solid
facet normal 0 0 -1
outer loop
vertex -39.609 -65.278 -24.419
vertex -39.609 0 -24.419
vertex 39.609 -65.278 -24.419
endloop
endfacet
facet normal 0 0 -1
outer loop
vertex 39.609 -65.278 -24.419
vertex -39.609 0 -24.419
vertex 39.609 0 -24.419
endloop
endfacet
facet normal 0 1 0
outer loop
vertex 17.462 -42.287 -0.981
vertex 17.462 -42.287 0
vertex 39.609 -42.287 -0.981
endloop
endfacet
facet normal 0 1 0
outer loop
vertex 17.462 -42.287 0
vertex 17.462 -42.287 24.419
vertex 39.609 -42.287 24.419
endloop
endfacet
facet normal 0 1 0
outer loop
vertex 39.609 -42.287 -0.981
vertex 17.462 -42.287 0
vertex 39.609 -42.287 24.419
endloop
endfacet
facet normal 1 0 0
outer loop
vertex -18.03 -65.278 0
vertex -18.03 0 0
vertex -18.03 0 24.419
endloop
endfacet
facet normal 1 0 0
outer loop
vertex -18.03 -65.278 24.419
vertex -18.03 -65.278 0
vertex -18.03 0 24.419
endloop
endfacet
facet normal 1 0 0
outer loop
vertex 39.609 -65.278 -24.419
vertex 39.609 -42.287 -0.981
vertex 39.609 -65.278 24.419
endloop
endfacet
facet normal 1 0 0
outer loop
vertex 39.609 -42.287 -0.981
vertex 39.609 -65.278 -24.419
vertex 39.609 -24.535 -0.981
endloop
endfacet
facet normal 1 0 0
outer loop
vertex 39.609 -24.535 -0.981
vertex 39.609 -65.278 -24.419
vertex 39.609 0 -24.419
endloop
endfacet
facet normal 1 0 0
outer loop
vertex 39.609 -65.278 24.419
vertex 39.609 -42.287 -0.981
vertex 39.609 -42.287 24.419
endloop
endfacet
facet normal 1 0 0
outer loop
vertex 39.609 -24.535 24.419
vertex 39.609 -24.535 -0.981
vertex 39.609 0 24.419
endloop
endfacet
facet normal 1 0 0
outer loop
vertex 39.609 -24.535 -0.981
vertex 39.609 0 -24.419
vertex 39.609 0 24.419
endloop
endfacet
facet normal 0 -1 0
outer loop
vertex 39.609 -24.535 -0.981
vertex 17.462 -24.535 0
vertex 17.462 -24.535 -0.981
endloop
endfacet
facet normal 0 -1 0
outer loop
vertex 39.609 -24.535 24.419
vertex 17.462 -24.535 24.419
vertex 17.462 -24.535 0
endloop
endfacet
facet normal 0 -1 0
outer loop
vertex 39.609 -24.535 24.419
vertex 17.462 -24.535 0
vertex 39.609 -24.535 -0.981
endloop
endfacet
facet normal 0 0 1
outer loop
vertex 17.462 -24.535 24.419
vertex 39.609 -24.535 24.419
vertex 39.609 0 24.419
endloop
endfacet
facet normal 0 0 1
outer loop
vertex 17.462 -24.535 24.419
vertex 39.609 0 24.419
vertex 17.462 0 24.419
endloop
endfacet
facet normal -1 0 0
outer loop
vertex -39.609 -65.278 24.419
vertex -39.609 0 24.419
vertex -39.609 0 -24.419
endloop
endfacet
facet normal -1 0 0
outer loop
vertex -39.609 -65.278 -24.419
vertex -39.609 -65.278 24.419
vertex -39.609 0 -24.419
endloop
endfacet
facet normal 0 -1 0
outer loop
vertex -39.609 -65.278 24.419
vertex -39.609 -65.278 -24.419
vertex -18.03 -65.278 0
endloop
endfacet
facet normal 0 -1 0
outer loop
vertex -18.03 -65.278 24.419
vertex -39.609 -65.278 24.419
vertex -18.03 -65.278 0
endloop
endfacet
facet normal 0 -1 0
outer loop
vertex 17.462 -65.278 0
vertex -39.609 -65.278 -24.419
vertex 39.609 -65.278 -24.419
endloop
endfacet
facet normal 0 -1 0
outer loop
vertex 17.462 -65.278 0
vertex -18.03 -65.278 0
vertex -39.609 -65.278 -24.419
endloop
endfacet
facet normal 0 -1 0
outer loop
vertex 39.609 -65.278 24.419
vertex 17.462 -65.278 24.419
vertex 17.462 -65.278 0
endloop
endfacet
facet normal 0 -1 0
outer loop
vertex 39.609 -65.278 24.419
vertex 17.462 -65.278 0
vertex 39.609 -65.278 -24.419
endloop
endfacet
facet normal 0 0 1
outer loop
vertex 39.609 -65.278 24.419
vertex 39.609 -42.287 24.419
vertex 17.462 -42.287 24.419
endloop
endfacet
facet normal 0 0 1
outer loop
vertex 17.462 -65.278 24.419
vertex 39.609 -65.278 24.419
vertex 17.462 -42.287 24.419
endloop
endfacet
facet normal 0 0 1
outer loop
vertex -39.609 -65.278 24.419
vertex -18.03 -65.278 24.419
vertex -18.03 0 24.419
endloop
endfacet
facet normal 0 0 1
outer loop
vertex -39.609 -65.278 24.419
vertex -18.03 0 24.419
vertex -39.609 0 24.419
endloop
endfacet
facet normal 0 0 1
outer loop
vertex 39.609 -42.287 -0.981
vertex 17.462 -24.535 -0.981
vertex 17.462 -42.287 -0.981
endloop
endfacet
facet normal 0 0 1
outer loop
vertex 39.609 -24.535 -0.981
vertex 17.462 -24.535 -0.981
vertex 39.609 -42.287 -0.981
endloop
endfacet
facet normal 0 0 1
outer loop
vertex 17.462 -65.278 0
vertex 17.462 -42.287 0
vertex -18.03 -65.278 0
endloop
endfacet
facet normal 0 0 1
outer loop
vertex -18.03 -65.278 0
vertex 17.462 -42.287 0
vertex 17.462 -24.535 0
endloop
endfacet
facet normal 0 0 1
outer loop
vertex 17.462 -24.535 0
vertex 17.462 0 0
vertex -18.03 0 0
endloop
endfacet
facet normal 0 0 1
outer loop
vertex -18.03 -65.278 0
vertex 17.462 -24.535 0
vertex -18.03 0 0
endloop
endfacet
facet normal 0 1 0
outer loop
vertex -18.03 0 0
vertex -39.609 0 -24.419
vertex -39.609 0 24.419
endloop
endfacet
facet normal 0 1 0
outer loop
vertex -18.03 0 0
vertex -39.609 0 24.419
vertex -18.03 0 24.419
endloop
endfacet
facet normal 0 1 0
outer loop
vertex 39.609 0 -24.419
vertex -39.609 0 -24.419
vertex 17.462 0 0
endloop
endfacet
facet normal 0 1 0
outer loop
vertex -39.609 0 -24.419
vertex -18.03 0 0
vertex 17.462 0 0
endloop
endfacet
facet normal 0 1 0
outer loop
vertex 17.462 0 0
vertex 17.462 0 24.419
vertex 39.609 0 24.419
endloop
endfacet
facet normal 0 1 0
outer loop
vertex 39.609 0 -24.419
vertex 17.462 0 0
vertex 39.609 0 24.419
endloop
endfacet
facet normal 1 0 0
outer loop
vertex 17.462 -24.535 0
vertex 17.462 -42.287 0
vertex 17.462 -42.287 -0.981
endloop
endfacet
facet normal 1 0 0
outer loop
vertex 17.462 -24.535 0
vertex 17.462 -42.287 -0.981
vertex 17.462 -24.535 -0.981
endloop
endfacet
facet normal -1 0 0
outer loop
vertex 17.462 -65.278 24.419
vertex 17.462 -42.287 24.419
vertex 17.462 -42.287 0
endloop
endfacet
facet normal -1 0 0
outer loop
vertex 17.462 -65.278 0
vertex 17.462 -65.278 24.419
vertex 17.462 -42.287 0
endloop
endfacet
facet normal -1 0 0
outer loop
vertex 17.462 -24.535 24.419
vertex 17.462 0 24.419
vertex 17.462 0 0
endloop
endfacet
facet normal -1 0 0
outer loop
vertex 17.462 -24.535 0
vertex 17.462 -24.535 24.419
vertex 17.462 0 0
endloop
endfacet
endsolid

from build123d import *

# Parameters (mm, degrees)
F1_DEPTH = 65.278
F2_W     = 22.147088
F2_H     = 17.75202
F3_DEPTH = 25.4


with BuildPart() as f1:
    # F0 (on Front) → F1 (new body)
    with BuildSketch(Plane.XZ):
        Polygon((-18.030003, 24.418592), (-39.609224, 24.418592), (-39.609224, -24.418592), (39.609224, -24.418592), (39.609224, 24.418592), (17.462136, 24.418592), (17.462136, 0), (-11.215512, 0), (-18.030003, 0), align=None)
    extrude(amount=F1_DEPTH)

    # F2 (on face) → F3 (cut)
    with BuildSketch(Plane.XY.offset(24.418592)):
        with Locations((28.53568, -33.411176)):
            Rectangle(F2_W, F2_H)
    extrude(amount=-F3_DEPTH, mode=Mode.SUBTRACT)


solid = f1.part
